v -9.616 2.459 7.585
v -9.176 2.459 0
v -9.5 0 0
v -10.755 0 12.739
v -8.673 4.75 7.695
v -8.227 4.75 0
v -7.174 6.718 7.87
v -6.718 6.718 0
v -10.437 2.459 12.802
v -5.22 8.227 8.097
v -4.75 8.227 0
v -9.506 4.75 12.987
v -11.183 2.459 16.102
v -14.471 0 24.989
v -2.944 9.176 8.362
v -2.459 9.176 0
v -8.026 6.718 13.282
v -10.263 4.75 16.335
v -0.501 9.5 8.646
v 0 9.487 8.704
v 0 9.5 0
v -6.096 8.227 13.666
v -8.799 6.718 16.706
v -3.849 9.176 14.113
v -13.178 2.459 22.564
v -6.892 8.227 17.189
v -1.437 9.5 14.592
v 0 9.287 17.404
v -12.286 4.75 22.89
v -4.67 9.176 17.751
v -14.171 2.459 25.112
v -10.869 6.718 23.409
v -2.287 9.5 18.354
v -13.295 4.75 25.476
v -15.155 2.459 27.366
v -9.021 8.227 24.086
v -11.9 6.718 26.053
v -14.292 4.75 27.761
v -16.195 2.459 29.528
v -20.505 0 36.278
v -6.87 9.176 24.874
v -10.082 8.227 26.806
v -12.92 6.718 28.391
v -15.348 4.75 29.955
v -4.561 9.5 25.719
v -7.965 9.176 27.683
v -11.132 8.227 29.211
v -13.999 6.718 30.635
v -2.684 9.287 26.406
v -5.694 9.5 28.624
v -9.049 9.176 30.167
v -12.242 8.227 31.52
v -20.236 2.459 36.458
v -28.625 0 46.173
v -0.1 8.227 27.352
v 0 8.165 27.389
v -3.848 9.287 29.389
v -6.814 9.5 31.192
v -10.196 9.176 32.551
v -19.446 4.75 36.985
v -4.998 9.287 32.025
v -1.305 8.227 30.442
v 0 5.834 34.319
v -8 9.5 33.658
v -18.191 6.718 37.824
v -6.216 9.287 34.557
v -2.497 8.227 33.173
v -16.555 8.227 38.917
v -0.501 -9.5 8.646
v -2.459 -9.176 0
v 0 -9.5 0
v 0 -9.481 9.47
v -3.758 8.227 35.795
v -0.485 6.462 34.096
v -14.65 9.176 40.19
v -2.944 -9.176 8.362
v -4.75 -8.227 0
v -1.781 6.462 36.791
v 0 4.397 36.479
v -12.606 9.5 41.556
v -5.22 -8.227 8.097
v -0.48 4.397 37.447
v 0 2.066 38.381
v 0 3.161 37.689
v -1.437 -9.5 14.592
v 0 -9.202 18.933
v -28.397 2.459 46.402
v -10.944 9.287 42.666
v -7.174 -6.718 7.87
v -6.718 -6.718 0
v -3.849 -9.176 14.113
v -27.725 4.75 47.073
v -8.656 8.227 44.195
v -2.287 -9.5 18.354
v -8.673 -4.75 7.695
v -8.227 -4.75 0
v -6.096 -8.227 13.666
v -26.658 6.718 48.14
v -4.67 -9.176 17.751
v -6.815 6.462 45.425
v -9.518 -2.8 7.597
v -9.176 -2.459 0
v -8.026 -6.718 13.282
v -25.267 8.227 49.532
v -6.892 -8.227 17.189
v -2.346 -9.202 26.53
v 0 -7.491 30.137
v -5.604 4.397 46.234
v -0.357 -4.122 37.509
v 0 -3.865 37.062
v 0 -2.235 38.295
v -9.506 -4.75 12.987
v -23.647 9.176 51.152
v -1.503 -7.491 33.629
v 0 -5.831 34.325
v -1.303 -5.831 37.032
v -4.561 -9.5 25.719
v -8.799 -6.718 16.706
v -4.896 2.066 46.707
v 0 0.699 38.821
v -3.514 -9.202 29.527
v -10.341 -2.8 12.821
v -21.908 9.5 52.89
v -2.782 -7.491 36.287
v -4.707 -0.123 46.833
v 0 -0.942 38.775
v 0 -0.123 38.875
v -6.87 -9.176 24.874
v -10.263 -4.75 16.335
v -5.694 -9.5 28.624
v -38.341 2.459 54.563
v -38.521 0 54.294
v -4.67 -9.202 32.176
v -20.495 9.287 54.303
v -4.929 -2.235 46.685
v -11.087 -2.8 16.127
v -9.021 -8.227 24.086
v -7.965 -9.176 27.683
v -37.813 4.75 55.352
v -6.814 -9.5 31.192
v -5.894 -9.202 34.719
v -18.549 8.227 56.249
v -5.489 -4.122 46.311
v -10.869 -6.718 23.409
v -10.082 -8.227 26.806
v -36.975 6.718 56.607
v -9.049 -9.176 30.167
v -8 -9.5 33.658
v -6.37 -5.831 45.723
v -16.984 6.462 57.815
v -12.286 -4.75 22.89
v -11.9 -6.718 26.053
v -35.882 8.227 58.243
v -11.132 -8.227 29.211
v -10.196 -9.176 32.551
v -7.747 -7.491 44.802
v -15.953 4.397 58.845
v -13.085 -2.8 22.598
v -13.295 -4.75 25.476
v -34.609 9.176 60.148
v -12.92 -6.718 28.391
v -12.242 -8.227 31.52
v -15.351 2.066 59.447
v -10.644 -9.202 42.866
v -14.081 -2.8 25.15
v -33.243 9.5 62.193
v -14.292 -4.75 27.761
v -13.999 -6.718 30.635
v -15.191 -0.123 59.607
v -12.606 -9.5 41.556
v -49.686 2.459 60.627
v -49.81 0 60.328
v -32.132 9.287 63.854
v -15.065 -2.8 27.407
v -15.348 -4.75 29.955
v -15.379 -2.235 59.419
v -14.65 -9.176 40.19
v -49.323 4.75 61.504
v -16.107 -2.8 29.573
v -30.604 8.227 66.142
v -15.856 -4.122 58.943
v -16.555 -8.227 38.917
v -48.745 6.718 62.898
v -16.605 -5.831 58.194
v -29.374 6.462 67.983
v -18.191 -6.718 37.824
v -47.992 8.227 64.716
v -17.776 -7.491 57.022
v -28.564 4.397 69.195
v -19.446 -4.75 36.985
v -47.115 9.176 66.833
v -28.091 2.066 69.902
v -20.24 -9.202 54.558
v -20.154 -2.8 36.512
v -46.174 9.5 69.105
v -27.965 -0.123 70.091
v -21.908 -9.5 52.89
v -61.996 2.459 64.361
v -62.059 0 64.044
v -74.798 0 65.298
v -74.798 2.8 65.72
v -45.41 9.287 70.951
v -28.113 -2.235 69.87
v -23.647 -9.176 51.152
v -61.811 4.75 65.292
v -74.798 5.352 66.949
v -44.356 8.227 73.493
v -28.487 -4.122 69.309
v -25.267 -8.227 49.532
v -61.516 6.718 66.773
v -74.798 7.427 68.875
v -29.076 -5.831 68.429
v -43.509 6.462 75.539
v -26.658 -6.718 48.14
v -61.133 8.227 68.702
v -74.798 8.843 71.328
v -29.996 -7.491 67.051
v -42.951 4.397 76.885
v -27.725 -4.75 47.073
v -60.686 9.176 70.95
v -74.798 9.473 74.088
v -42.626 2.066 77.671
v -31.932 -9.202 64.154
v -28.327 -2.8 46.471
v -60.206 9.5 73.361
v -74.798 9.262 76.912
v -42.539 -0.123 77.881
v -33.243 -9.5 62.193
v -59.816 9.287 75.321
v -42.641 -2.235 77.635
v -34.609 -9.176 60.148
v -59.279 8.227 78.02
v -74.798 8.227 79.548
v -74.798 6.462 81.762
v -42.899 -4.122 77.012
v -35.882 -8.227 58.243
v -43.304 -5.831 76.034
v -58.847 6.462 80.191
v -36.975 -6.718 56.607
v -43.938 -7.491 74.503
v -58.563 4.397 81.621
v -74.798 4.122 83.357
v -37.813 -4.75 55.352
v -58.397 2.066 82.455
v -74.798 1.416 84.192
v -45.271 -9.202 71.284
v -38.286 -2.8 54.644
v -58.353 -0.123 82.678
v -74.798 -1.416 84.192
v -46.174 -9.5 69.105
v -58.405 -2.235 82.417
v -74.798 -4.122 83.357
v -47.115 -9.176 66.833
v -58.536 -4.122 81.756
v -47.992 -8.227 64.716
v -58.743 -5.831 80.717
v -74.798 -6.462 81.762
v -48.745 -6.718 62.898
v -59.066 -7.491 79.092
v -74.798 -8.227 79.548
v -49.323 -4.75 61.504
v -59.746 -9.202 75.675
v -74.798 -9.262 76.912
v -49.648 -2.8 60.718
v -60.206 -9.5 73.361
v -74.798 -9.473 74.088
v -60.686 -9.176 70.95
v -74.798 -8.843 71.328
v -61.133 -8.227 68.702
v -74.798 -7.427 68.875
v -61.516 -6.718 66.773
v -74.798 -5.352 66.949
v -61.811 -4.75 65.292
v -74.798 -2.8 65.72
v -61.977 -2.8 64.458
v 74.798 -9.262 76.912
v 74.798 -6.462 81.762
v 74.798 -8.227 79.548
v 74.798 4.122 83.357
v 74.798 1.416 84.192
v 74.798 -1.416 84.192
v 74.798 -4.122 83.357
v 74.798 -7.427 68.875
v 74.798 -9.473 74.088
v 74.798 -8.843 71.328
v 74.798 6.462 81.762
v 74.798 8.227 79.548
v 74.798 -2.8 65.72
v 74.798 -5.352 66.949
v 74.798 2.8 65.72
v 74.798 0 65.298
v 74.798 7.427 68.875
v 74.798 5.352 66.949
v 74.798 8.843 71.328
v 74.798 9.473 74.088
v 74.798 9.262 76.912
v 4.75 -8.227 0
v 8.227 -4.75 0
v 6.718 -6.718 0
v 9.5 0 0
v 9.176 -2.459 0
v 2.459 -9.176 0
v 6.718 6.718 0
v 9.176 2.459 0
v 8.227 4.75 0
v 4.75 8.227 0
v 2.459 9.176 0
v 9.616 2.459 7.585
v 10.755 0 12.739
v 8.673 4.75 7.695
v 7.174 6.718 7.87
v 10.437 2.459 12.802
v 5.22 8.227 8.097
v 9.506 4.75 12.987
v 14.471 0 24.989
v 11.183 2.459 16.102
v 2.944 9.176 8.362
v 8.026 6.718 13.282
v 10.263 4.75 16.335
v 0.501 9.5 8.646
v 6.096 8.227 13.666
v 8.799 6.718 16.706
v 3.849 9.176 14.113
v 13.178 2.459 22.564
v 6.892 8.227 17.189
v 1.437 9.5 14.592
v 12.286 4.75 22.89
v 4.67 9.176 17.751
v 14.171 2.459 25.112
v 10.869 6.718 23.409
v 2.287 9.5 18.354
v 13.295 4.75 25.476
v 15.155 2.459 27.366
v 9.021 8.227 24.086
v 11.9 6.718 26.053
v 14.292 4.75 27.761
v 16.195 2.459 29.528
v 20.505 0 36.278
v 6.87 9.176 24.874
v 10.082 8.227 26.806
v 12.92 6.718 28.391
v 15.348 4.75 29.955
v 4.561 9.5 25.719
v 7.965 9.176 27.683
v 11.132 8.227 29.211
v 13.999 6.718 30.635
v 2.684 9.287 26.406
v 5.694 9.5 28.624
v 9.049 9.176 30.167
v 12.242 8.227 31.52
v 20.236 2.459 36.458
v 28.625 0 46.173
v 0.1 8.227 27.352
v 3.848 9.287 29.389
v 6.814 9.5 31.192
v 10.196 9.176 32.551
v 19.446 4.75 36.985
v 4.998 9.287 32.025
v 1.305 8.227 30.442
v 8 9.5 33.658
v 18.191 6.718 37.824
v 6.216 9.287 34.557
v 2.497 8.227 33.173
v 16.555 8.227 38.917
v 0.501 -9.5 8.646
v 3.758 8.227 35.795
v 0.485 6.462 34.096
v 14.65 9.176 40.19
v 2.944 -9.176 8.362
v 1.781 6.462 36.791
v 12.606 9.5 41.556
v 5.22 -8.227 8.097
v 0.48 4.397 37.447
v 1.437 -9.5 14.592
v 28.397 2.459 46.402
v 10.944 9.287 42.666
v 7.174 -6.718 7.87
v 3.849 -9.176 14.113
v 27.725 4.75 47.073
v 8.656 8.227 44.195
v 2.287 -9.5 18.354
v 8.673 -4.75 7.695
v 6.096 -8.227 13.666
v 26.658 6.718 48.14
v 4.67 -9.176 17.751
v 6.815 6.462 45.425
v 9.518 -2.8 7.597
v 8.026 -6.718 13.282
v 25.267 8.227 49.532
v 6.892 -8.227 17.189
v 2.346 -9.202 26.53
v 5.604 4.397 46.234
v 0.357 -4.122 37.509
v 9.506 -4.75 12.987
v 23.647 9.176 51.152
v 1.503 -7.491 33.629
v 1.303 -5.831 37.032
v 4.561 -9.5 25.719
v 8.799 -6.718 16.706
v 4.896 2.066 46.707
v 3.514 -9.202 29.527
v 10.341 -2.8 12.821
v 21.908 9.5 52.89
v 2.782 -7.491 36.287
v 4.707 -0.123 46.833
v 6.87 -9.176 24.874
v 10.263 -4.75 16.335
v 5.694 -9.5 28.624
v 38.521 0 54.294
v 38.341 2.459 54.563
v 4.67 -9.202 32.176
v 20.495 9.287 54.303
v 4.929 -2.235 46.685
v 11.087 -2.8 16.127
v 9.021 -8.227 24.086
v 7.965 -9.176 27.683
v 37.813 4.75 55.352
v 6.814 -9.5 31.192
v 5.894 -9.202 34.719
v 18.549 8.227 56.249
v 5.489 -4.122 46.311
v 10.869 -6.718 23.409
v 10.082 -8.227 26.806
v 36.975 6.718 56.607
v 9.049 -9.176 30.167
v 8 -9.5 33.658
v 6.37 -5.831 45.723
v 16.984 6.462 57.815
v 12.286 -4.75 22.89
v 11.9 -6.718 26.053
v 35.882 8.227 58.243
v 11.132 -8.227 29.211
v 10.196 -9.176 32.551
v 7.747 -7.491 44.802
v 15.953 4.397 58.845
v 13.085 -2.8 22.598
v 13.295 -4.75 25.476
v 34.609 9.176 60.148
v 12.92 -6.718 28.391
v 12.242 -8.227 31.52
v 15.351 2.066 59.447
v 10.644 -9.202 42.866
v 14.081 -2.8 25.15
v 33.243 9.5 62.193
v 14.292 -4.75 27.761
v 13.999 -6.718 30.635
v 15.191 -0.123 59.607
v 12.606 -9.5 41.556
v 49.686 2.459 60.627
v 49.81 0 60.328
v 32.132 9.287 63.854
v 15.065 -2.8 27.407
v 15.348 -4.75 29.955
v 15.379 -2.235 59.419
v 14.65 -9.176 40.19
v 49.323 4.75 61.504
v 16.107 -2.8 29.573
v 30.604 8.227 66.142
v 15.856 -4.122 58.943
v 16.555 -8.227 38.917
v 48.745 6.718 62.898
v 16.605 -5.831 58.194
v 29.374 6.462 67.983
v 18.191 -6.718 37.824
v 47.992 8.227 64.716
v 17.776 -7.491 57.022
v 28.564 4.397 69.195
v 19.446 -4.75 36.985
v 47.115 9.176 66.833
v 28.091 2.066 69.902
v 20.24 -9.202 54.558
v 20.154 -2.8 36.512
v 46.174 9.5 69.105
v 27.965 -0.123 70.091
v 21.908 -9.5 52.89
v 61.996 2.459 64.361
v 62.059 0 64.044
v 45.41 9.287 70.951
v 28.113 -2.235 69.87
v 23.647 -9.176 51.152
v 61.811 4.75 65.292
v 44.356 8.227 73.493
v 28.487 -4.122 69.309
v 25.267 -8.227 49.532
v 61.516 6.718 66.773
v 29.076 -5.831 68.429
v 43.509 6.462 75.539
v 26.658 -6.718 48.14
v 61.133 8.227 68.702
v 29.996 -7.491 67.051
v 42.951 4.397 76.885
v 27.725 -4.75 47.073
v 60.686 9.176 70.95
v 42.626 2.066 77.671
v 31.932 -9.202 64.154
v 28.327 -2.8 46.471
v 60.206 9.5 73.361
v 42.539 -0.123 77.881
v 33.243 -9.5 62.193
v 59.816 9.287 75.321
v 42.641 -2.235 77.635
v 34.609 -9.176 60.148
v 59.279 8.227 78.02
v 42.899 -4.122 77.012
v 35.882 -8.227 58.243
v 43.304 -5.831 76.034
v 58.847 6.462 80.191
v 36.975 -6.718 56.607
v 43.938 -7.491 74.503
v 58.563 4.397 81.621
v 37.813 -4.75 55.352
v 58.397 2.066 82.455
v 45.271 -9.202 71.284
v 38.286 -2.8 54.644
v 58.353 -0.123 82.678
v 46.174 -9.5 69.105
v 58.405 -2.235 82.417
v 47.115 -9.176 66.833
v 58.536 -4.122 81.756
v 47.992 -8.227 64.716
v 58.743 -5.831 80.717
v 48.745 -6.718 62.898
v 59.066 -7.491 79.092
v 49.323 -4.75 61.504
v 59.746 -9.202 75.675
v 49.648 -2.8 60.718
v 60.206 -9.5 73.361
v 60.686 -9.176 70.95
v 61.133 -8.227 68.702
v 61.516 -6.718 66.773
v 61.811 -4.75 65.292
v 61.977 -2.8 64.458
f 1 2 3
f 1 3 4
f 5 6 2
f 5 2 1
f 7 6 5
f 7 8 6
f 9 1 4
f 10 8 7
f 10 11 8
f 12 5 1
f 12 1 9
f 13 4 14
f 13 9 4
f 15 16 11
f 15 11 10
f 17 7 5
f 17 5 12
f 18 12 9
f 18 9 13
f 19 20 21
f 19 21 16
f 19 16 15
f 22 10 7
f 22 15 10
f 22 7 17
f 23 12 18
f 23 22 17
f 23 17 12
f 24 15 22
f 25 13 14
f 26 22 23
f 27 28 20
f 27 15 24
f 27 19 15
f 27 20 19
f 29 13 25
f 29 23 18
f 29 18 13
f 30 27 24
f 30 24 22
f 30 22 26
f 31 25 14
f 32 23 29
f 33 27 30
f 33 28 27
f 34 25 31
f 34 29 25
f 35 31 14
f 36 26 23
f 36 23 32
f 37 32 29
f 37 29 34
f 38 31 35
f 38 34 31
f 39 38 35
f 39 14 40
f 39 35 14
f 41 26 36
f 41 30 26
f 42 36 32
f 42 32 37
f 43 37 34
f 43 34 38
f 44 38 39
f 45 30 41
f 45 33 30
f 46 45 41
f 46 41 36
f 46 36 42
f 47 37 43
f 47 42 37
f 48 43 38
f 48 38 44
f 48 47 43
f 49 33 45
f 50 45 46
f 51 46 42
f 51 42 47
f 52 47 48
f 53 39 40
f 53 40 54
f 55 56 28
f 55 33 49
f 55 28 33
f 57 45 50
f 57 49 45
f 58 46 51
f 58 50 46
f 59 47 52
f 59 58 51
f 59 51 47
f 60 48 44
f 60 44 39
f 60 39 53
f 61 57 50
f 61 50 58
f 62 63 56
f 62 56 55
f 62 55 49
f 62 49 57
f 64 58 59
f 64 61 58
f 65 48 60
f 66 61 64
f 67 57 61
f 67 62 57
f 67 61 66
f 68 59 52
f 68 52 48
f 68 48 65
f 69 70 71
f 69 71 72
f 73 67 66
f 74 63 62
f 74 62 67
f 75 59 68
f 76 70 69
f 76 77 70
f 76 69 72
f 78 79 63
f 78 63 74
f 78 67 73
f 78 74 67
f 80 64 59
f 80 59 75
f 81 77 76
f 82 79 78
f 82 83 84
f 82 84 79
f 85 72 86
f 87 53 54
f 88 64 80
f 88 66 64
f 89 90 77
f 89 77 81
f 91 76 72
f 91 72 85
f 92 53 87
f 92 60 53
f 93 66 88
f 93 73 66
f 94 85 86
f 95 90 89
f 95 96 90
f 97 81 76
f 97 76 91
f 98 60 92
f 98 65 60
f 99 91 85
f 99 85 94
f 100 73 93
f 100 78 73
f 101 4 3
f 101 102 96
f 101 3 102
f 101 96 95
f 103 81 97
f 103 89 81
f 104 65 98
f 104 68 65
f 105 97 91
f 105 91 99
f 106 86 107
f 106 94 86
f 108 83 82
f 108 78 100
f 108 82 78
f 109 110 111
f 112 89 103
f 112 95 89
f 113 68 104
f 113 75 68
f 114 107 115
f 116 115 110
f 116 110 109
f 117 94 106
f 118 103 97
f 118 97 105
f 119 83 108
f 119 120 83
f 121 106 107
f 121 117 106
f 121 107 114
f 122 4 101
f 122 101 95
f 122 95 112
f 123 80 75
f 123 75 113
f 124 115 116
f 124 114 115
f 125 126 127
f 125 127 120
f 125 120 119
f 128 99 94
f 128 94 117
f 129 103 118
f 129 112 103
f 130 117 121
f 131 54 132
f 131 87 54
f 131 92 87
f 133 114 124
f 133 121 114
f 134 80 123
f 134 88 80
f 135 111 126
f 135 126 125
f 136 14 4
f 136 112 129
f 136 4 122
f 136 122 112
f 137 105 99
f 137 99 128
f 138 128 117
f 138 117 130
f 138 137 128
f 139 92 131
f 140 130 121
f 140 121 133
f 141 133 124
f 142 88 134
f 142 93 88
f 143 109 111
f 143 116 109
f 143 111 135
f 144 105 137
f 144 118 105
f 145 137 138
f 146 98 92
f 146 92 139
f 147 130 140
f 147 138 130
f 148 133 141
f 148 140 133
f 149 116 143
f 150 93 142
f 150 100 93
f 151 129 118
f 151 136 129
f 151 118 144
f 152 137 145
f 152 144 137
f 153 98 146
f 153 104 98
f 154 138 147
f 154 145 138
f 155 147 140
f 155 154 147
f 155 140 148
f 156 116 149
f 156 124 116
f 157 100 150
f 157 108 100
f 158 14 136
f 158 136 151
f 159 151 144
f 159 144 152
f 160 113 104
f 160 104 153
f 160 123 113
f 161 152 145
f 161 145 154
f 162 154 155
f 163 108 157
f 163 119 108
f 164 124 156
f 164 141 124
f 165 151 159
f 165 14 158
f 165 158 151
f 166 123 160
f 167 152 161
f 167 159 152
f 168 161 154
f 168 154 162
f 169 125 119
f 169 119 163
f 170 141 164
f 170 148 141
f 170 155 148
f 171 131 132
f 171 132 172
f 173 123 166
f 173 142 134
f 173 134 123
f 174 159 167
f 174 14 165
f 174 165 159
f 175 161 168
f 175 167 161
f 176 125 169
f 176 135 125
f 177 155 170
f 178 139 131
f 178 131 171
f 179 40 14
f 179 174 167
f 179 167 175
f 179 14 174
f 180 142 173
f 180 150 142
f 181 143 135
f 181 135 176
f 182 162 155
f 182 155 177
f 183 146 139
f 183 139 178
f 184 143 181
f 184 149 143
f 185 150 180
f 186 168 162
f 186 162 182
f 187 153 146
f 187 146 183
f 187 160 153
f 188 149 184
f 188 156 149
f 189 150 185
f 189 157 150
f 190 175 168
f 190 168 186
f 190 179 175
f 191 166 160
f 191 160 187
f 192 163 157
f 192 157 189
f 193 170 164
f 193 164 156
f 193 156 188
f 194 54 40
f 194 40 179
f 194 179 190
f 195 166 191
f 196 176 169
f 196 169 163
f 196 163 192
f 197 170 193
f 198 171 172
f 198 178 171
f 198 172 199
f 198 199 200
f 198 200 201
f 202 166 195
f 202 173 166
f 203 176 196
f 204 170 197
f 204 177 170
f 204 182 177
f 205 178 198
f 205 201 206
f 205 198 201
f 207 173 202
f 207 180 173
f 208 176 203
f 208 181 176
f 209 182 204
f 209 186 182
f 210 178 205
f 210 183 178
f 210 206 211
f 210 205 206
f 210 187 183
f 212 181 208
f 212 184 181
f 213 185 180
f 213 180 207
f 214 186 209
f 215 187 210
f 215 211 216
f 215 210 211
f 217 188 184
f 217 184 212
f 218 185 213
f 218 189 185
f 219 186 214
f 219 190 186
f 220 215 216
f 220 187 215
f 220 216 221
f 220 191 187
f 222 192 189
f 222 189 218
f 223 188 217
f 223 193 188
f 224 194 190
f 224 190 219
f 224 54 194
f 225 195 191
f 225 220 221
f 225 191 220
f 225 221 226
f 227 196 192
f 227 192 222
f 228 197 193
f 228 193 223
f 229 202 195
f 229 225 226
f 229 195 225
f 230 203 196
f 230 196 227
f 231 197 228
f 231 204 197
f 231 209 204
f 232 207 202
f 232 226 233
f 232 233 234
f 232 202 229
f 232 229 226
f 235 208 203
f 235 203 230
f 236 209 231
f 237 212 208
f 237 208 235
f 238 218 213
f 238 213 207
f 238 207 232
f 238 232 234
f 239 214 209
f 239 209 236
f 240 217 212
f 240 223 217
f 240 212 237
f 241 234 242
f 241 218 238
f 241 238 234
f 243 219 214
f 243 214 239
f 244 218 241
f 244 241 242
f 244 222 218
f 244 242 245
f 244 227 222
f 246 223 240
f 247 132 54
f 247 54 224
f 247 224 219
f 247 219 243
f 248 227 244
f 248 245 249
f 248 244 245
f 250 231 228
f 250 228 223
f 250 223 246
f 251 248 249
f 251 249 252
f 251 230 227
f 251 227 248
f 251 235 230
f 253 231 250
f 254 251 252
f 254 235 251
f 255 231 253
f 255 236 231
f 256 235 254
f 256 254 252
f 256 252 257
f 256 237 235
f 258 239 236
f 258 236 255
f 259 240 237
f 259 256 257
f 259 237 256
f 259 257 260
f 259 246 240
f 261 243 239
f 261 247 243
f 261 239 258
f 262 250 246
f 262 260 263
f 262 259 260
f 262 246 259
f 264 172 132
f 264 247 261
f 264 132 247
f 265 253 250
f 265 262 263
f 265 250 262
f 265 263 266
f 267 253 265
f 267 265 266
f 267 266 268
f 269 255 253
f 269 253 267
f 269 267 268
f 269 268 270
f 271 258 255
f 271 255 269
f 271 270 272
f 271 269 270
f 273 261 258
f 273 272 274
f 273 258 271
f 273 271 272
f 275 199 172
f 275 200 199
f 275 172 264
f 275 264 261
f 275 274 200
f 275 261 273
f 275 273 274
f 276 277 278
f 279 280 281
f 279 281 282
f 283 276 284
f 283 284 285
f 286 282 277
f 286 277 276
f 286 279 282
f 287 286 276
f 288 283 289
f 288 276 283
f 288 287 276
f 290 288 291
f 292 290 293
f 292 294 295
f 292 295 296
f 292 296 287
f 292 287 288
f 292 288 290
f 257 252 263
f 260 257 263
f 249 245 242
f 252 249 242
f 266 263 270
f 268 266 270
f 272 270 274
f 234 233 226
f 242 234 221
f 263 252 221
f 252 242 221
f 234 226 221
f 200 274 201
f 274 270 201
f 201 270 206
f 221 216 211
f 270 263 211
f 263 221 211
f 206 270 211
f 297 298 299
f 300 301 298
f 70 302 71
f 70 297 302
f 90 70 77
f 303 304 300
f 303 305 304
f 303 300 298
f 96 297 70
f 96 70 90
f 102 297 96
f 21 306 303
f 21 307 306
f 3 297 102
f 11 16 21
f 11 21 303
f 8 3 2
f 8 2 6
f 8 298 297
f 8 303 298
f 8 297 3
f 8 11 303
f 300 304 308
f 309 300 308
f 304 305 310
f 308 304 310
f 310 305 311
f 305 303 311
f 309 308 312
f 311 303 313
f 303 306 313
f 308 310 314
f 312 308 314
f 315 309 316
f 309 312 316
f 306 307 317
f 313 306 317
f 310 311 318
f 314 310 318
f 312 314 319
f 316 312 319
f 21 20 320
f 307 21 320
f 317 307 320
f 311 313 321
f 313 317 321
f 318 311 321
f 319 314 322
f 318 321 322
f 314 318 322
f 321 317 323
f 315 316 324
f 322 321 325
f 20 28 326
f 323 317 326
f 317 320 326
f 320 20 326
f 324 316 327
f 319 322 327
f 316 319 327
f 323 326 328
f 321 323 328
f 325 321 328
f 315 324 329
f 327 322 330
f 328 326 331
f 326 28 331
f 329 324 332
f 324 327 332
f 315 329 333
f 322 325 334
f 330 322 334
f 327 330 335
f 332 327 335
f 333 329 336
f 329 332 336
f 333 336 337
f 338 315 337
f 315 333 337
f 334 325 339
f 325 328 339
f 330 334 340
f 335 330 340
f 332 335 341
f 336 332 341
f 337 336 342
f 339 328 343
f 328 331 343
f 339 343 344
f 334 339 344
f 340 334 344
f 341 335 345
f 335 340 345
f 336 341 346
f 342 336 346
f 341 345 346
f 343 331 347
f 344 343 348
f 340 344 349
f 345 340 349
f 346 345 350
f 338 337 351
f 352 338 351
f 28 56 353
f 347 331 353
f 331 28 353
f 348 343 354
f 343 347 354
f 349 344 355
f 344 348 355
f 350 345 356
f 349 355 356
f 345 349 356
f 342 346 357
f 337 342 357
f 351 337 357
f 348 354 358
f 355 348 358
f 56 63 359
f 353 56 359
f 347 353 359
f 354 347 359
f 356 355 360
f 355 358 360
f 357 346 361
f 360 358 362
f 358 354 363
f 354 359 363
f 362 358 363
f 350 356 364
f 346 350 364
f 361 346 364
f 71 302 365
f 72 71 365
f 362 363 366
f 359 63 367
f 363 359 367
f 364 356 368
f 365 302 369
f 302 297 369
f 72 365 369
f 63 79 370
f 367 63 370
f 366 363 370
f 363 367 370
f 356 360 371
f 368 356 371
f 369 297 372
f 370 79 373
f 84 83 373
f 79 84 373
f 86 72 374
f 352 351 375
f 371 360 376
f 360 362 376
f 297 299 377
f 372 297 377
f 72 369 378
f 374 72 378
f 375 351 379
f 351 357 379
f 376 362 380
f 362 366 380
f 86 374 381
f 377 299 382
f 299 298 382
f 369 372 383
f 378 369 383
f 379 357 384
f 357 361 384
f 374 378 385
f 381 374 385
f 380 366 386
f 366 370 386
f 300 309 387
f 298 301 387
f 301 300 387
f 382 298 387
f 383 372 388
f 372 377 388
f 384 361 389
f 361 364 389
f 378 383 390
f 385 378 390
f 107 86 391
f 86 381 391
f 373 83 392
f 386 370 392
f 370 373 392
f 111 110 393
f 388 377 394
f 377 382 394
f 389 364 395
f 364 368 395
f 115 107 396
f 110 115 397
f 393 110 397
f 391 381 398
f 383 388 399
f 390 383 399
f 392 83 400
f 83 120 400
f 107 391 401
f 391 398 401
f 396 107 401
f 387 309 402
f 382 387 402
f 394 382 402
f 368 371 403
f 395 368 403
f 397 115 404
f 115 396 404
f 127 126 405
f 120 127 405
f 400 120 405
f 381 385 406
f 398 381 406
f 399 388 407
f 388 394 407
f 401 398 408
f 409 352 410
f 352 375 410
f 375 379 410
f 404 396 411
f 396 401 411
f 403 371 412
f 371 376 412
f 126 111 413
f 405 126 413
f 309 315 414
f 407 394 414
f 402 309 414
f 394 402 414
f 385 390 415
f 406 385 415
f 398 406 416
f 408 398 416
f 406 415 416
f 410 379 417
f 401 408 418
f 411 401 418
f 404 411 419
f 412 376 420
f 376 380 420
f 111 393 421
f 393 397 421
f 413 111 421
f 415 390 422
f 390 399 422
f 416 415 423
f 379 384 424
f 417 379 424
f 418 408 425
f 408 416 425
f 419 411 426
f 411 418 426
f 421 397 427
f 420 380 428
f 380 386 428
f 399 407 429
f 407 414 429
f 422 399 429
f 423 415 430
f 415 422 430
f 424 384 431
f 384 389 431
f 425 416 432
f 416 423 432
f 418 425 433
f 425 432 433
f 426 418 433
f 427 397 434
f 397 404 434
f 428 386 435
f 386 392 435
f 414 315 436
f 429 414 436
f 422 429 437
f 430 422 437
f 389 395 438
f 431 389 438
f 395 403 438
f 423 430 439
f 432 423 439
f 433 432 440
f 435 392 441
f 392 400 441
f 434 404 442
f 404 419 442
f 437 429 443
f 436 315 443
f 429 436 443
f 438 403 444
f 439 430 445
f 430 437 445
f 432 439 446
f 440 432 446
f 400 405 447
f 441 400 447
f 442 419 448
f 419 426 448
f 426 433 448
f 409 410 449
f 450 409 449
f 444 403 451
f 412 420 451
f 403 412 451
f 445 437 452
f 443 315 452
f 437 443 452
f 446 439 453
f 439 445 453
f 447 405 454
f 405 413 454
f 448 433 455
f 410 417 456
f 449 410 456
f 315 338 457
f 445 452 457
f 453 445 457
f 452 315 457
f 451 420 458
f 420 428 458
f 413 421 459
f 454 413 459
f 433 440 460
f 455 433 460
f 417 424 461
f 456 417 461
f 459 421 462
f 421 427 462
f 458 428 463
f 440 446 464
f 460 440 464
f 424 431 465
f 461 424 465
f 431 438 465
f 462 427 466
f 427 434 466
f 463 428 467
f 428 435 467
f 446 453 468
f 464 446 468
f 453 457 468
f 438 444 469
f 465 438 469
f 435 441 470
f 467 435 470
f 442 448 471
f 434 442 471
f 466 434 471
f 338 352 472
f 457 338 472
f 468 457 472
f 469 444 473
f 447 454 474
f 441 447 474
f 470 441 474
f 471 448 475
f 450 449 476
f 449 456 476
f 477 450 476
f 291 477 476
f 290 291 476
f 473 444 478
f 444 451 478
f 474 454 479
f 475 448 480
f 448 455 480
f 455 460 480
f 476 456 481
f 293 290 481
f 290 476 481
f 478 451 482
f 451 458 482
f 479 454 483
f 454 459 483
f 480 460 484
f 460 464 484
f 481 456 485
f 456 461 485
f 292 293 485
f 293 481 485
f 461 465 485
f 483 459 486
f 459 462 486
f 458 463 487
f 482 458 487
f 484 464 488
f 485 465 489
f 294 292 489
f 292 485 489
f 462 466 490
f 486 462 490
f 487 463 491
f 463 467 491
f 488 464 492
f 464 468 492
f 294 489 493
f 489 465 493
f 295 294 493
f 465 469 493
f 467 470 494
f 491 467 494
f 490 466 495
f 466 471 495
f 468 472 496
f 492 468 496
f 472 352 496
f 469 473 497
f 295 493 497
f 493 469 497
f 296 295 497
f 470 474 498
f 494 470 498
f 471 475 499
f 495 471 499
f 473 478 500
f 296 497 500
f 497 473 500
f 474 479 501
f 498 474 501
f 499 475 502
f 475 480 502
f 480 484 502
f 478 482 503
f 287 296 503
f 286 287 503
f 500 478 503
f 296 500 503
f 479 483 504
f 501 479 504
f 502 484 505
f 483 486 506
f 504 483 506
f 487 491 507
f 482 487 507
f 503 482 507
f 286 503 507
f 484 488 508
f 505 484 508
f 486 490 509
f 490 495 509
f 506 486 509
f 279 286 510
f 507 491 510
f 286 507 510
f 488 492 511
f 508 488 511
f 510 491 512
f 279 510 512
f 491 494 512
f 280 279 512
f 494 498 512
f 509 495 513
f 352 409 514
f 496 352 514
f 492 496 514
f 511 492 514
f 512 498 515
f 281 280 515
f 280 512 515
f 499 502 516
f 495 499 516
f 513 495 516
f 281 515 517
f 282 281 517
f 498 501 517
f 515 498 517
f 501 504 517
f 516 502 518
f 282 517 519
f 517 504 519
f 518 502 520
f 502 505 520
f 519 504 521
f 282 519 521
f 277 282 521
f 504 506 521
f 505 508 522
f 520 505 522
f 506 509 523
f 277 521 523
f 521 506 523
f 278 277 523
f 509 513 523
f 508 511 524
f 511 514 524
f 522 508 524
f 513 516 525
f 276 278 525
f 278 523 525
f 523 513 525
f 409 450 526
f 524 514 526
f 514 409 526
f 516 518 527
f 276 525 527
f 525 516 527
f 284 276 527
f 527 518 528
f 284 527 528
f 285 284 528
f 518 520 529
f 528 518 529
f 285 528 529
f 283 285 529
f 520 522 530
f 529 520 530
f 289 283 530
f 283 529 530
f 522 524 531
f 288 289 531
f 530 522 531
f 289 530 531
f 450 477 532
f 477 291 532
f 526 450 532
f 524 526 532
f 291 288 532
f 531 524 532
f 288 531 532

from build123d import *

# Parameters (mm, degrees)
F0_R     = 9.5
F1_ANGLE = 90
F2_W     = 145.696804
F2_H     = 128.937841
F3_DEPTH = 25


with BuildPart() as f1:
    # F0 (on Top) → F1 (revolve)
    with BuildSketch(Plane.XY):
        Circle(F0_R)
    revolve(axis=Axis((74.798293, -7.044435, 0), (0, 1, 0)), revolution_arc=F1_ANGLE)

    # F2 (on Right) → F3 (cut)
    with BuildSketch(Plane.YZ):
        with Locations((-1.890838, 3.012911)):
            Rectangle(F2_W, F2_H)
    extrude(amount=-F3_DEPTH, mode=Mode.SUBTRACT)

    # F4: F1 across plane


with BuildPart() as f1_1:
    add(f1.part)
    add(f1.part.mirror(Plane.YZ))


solid = f1_1.part
